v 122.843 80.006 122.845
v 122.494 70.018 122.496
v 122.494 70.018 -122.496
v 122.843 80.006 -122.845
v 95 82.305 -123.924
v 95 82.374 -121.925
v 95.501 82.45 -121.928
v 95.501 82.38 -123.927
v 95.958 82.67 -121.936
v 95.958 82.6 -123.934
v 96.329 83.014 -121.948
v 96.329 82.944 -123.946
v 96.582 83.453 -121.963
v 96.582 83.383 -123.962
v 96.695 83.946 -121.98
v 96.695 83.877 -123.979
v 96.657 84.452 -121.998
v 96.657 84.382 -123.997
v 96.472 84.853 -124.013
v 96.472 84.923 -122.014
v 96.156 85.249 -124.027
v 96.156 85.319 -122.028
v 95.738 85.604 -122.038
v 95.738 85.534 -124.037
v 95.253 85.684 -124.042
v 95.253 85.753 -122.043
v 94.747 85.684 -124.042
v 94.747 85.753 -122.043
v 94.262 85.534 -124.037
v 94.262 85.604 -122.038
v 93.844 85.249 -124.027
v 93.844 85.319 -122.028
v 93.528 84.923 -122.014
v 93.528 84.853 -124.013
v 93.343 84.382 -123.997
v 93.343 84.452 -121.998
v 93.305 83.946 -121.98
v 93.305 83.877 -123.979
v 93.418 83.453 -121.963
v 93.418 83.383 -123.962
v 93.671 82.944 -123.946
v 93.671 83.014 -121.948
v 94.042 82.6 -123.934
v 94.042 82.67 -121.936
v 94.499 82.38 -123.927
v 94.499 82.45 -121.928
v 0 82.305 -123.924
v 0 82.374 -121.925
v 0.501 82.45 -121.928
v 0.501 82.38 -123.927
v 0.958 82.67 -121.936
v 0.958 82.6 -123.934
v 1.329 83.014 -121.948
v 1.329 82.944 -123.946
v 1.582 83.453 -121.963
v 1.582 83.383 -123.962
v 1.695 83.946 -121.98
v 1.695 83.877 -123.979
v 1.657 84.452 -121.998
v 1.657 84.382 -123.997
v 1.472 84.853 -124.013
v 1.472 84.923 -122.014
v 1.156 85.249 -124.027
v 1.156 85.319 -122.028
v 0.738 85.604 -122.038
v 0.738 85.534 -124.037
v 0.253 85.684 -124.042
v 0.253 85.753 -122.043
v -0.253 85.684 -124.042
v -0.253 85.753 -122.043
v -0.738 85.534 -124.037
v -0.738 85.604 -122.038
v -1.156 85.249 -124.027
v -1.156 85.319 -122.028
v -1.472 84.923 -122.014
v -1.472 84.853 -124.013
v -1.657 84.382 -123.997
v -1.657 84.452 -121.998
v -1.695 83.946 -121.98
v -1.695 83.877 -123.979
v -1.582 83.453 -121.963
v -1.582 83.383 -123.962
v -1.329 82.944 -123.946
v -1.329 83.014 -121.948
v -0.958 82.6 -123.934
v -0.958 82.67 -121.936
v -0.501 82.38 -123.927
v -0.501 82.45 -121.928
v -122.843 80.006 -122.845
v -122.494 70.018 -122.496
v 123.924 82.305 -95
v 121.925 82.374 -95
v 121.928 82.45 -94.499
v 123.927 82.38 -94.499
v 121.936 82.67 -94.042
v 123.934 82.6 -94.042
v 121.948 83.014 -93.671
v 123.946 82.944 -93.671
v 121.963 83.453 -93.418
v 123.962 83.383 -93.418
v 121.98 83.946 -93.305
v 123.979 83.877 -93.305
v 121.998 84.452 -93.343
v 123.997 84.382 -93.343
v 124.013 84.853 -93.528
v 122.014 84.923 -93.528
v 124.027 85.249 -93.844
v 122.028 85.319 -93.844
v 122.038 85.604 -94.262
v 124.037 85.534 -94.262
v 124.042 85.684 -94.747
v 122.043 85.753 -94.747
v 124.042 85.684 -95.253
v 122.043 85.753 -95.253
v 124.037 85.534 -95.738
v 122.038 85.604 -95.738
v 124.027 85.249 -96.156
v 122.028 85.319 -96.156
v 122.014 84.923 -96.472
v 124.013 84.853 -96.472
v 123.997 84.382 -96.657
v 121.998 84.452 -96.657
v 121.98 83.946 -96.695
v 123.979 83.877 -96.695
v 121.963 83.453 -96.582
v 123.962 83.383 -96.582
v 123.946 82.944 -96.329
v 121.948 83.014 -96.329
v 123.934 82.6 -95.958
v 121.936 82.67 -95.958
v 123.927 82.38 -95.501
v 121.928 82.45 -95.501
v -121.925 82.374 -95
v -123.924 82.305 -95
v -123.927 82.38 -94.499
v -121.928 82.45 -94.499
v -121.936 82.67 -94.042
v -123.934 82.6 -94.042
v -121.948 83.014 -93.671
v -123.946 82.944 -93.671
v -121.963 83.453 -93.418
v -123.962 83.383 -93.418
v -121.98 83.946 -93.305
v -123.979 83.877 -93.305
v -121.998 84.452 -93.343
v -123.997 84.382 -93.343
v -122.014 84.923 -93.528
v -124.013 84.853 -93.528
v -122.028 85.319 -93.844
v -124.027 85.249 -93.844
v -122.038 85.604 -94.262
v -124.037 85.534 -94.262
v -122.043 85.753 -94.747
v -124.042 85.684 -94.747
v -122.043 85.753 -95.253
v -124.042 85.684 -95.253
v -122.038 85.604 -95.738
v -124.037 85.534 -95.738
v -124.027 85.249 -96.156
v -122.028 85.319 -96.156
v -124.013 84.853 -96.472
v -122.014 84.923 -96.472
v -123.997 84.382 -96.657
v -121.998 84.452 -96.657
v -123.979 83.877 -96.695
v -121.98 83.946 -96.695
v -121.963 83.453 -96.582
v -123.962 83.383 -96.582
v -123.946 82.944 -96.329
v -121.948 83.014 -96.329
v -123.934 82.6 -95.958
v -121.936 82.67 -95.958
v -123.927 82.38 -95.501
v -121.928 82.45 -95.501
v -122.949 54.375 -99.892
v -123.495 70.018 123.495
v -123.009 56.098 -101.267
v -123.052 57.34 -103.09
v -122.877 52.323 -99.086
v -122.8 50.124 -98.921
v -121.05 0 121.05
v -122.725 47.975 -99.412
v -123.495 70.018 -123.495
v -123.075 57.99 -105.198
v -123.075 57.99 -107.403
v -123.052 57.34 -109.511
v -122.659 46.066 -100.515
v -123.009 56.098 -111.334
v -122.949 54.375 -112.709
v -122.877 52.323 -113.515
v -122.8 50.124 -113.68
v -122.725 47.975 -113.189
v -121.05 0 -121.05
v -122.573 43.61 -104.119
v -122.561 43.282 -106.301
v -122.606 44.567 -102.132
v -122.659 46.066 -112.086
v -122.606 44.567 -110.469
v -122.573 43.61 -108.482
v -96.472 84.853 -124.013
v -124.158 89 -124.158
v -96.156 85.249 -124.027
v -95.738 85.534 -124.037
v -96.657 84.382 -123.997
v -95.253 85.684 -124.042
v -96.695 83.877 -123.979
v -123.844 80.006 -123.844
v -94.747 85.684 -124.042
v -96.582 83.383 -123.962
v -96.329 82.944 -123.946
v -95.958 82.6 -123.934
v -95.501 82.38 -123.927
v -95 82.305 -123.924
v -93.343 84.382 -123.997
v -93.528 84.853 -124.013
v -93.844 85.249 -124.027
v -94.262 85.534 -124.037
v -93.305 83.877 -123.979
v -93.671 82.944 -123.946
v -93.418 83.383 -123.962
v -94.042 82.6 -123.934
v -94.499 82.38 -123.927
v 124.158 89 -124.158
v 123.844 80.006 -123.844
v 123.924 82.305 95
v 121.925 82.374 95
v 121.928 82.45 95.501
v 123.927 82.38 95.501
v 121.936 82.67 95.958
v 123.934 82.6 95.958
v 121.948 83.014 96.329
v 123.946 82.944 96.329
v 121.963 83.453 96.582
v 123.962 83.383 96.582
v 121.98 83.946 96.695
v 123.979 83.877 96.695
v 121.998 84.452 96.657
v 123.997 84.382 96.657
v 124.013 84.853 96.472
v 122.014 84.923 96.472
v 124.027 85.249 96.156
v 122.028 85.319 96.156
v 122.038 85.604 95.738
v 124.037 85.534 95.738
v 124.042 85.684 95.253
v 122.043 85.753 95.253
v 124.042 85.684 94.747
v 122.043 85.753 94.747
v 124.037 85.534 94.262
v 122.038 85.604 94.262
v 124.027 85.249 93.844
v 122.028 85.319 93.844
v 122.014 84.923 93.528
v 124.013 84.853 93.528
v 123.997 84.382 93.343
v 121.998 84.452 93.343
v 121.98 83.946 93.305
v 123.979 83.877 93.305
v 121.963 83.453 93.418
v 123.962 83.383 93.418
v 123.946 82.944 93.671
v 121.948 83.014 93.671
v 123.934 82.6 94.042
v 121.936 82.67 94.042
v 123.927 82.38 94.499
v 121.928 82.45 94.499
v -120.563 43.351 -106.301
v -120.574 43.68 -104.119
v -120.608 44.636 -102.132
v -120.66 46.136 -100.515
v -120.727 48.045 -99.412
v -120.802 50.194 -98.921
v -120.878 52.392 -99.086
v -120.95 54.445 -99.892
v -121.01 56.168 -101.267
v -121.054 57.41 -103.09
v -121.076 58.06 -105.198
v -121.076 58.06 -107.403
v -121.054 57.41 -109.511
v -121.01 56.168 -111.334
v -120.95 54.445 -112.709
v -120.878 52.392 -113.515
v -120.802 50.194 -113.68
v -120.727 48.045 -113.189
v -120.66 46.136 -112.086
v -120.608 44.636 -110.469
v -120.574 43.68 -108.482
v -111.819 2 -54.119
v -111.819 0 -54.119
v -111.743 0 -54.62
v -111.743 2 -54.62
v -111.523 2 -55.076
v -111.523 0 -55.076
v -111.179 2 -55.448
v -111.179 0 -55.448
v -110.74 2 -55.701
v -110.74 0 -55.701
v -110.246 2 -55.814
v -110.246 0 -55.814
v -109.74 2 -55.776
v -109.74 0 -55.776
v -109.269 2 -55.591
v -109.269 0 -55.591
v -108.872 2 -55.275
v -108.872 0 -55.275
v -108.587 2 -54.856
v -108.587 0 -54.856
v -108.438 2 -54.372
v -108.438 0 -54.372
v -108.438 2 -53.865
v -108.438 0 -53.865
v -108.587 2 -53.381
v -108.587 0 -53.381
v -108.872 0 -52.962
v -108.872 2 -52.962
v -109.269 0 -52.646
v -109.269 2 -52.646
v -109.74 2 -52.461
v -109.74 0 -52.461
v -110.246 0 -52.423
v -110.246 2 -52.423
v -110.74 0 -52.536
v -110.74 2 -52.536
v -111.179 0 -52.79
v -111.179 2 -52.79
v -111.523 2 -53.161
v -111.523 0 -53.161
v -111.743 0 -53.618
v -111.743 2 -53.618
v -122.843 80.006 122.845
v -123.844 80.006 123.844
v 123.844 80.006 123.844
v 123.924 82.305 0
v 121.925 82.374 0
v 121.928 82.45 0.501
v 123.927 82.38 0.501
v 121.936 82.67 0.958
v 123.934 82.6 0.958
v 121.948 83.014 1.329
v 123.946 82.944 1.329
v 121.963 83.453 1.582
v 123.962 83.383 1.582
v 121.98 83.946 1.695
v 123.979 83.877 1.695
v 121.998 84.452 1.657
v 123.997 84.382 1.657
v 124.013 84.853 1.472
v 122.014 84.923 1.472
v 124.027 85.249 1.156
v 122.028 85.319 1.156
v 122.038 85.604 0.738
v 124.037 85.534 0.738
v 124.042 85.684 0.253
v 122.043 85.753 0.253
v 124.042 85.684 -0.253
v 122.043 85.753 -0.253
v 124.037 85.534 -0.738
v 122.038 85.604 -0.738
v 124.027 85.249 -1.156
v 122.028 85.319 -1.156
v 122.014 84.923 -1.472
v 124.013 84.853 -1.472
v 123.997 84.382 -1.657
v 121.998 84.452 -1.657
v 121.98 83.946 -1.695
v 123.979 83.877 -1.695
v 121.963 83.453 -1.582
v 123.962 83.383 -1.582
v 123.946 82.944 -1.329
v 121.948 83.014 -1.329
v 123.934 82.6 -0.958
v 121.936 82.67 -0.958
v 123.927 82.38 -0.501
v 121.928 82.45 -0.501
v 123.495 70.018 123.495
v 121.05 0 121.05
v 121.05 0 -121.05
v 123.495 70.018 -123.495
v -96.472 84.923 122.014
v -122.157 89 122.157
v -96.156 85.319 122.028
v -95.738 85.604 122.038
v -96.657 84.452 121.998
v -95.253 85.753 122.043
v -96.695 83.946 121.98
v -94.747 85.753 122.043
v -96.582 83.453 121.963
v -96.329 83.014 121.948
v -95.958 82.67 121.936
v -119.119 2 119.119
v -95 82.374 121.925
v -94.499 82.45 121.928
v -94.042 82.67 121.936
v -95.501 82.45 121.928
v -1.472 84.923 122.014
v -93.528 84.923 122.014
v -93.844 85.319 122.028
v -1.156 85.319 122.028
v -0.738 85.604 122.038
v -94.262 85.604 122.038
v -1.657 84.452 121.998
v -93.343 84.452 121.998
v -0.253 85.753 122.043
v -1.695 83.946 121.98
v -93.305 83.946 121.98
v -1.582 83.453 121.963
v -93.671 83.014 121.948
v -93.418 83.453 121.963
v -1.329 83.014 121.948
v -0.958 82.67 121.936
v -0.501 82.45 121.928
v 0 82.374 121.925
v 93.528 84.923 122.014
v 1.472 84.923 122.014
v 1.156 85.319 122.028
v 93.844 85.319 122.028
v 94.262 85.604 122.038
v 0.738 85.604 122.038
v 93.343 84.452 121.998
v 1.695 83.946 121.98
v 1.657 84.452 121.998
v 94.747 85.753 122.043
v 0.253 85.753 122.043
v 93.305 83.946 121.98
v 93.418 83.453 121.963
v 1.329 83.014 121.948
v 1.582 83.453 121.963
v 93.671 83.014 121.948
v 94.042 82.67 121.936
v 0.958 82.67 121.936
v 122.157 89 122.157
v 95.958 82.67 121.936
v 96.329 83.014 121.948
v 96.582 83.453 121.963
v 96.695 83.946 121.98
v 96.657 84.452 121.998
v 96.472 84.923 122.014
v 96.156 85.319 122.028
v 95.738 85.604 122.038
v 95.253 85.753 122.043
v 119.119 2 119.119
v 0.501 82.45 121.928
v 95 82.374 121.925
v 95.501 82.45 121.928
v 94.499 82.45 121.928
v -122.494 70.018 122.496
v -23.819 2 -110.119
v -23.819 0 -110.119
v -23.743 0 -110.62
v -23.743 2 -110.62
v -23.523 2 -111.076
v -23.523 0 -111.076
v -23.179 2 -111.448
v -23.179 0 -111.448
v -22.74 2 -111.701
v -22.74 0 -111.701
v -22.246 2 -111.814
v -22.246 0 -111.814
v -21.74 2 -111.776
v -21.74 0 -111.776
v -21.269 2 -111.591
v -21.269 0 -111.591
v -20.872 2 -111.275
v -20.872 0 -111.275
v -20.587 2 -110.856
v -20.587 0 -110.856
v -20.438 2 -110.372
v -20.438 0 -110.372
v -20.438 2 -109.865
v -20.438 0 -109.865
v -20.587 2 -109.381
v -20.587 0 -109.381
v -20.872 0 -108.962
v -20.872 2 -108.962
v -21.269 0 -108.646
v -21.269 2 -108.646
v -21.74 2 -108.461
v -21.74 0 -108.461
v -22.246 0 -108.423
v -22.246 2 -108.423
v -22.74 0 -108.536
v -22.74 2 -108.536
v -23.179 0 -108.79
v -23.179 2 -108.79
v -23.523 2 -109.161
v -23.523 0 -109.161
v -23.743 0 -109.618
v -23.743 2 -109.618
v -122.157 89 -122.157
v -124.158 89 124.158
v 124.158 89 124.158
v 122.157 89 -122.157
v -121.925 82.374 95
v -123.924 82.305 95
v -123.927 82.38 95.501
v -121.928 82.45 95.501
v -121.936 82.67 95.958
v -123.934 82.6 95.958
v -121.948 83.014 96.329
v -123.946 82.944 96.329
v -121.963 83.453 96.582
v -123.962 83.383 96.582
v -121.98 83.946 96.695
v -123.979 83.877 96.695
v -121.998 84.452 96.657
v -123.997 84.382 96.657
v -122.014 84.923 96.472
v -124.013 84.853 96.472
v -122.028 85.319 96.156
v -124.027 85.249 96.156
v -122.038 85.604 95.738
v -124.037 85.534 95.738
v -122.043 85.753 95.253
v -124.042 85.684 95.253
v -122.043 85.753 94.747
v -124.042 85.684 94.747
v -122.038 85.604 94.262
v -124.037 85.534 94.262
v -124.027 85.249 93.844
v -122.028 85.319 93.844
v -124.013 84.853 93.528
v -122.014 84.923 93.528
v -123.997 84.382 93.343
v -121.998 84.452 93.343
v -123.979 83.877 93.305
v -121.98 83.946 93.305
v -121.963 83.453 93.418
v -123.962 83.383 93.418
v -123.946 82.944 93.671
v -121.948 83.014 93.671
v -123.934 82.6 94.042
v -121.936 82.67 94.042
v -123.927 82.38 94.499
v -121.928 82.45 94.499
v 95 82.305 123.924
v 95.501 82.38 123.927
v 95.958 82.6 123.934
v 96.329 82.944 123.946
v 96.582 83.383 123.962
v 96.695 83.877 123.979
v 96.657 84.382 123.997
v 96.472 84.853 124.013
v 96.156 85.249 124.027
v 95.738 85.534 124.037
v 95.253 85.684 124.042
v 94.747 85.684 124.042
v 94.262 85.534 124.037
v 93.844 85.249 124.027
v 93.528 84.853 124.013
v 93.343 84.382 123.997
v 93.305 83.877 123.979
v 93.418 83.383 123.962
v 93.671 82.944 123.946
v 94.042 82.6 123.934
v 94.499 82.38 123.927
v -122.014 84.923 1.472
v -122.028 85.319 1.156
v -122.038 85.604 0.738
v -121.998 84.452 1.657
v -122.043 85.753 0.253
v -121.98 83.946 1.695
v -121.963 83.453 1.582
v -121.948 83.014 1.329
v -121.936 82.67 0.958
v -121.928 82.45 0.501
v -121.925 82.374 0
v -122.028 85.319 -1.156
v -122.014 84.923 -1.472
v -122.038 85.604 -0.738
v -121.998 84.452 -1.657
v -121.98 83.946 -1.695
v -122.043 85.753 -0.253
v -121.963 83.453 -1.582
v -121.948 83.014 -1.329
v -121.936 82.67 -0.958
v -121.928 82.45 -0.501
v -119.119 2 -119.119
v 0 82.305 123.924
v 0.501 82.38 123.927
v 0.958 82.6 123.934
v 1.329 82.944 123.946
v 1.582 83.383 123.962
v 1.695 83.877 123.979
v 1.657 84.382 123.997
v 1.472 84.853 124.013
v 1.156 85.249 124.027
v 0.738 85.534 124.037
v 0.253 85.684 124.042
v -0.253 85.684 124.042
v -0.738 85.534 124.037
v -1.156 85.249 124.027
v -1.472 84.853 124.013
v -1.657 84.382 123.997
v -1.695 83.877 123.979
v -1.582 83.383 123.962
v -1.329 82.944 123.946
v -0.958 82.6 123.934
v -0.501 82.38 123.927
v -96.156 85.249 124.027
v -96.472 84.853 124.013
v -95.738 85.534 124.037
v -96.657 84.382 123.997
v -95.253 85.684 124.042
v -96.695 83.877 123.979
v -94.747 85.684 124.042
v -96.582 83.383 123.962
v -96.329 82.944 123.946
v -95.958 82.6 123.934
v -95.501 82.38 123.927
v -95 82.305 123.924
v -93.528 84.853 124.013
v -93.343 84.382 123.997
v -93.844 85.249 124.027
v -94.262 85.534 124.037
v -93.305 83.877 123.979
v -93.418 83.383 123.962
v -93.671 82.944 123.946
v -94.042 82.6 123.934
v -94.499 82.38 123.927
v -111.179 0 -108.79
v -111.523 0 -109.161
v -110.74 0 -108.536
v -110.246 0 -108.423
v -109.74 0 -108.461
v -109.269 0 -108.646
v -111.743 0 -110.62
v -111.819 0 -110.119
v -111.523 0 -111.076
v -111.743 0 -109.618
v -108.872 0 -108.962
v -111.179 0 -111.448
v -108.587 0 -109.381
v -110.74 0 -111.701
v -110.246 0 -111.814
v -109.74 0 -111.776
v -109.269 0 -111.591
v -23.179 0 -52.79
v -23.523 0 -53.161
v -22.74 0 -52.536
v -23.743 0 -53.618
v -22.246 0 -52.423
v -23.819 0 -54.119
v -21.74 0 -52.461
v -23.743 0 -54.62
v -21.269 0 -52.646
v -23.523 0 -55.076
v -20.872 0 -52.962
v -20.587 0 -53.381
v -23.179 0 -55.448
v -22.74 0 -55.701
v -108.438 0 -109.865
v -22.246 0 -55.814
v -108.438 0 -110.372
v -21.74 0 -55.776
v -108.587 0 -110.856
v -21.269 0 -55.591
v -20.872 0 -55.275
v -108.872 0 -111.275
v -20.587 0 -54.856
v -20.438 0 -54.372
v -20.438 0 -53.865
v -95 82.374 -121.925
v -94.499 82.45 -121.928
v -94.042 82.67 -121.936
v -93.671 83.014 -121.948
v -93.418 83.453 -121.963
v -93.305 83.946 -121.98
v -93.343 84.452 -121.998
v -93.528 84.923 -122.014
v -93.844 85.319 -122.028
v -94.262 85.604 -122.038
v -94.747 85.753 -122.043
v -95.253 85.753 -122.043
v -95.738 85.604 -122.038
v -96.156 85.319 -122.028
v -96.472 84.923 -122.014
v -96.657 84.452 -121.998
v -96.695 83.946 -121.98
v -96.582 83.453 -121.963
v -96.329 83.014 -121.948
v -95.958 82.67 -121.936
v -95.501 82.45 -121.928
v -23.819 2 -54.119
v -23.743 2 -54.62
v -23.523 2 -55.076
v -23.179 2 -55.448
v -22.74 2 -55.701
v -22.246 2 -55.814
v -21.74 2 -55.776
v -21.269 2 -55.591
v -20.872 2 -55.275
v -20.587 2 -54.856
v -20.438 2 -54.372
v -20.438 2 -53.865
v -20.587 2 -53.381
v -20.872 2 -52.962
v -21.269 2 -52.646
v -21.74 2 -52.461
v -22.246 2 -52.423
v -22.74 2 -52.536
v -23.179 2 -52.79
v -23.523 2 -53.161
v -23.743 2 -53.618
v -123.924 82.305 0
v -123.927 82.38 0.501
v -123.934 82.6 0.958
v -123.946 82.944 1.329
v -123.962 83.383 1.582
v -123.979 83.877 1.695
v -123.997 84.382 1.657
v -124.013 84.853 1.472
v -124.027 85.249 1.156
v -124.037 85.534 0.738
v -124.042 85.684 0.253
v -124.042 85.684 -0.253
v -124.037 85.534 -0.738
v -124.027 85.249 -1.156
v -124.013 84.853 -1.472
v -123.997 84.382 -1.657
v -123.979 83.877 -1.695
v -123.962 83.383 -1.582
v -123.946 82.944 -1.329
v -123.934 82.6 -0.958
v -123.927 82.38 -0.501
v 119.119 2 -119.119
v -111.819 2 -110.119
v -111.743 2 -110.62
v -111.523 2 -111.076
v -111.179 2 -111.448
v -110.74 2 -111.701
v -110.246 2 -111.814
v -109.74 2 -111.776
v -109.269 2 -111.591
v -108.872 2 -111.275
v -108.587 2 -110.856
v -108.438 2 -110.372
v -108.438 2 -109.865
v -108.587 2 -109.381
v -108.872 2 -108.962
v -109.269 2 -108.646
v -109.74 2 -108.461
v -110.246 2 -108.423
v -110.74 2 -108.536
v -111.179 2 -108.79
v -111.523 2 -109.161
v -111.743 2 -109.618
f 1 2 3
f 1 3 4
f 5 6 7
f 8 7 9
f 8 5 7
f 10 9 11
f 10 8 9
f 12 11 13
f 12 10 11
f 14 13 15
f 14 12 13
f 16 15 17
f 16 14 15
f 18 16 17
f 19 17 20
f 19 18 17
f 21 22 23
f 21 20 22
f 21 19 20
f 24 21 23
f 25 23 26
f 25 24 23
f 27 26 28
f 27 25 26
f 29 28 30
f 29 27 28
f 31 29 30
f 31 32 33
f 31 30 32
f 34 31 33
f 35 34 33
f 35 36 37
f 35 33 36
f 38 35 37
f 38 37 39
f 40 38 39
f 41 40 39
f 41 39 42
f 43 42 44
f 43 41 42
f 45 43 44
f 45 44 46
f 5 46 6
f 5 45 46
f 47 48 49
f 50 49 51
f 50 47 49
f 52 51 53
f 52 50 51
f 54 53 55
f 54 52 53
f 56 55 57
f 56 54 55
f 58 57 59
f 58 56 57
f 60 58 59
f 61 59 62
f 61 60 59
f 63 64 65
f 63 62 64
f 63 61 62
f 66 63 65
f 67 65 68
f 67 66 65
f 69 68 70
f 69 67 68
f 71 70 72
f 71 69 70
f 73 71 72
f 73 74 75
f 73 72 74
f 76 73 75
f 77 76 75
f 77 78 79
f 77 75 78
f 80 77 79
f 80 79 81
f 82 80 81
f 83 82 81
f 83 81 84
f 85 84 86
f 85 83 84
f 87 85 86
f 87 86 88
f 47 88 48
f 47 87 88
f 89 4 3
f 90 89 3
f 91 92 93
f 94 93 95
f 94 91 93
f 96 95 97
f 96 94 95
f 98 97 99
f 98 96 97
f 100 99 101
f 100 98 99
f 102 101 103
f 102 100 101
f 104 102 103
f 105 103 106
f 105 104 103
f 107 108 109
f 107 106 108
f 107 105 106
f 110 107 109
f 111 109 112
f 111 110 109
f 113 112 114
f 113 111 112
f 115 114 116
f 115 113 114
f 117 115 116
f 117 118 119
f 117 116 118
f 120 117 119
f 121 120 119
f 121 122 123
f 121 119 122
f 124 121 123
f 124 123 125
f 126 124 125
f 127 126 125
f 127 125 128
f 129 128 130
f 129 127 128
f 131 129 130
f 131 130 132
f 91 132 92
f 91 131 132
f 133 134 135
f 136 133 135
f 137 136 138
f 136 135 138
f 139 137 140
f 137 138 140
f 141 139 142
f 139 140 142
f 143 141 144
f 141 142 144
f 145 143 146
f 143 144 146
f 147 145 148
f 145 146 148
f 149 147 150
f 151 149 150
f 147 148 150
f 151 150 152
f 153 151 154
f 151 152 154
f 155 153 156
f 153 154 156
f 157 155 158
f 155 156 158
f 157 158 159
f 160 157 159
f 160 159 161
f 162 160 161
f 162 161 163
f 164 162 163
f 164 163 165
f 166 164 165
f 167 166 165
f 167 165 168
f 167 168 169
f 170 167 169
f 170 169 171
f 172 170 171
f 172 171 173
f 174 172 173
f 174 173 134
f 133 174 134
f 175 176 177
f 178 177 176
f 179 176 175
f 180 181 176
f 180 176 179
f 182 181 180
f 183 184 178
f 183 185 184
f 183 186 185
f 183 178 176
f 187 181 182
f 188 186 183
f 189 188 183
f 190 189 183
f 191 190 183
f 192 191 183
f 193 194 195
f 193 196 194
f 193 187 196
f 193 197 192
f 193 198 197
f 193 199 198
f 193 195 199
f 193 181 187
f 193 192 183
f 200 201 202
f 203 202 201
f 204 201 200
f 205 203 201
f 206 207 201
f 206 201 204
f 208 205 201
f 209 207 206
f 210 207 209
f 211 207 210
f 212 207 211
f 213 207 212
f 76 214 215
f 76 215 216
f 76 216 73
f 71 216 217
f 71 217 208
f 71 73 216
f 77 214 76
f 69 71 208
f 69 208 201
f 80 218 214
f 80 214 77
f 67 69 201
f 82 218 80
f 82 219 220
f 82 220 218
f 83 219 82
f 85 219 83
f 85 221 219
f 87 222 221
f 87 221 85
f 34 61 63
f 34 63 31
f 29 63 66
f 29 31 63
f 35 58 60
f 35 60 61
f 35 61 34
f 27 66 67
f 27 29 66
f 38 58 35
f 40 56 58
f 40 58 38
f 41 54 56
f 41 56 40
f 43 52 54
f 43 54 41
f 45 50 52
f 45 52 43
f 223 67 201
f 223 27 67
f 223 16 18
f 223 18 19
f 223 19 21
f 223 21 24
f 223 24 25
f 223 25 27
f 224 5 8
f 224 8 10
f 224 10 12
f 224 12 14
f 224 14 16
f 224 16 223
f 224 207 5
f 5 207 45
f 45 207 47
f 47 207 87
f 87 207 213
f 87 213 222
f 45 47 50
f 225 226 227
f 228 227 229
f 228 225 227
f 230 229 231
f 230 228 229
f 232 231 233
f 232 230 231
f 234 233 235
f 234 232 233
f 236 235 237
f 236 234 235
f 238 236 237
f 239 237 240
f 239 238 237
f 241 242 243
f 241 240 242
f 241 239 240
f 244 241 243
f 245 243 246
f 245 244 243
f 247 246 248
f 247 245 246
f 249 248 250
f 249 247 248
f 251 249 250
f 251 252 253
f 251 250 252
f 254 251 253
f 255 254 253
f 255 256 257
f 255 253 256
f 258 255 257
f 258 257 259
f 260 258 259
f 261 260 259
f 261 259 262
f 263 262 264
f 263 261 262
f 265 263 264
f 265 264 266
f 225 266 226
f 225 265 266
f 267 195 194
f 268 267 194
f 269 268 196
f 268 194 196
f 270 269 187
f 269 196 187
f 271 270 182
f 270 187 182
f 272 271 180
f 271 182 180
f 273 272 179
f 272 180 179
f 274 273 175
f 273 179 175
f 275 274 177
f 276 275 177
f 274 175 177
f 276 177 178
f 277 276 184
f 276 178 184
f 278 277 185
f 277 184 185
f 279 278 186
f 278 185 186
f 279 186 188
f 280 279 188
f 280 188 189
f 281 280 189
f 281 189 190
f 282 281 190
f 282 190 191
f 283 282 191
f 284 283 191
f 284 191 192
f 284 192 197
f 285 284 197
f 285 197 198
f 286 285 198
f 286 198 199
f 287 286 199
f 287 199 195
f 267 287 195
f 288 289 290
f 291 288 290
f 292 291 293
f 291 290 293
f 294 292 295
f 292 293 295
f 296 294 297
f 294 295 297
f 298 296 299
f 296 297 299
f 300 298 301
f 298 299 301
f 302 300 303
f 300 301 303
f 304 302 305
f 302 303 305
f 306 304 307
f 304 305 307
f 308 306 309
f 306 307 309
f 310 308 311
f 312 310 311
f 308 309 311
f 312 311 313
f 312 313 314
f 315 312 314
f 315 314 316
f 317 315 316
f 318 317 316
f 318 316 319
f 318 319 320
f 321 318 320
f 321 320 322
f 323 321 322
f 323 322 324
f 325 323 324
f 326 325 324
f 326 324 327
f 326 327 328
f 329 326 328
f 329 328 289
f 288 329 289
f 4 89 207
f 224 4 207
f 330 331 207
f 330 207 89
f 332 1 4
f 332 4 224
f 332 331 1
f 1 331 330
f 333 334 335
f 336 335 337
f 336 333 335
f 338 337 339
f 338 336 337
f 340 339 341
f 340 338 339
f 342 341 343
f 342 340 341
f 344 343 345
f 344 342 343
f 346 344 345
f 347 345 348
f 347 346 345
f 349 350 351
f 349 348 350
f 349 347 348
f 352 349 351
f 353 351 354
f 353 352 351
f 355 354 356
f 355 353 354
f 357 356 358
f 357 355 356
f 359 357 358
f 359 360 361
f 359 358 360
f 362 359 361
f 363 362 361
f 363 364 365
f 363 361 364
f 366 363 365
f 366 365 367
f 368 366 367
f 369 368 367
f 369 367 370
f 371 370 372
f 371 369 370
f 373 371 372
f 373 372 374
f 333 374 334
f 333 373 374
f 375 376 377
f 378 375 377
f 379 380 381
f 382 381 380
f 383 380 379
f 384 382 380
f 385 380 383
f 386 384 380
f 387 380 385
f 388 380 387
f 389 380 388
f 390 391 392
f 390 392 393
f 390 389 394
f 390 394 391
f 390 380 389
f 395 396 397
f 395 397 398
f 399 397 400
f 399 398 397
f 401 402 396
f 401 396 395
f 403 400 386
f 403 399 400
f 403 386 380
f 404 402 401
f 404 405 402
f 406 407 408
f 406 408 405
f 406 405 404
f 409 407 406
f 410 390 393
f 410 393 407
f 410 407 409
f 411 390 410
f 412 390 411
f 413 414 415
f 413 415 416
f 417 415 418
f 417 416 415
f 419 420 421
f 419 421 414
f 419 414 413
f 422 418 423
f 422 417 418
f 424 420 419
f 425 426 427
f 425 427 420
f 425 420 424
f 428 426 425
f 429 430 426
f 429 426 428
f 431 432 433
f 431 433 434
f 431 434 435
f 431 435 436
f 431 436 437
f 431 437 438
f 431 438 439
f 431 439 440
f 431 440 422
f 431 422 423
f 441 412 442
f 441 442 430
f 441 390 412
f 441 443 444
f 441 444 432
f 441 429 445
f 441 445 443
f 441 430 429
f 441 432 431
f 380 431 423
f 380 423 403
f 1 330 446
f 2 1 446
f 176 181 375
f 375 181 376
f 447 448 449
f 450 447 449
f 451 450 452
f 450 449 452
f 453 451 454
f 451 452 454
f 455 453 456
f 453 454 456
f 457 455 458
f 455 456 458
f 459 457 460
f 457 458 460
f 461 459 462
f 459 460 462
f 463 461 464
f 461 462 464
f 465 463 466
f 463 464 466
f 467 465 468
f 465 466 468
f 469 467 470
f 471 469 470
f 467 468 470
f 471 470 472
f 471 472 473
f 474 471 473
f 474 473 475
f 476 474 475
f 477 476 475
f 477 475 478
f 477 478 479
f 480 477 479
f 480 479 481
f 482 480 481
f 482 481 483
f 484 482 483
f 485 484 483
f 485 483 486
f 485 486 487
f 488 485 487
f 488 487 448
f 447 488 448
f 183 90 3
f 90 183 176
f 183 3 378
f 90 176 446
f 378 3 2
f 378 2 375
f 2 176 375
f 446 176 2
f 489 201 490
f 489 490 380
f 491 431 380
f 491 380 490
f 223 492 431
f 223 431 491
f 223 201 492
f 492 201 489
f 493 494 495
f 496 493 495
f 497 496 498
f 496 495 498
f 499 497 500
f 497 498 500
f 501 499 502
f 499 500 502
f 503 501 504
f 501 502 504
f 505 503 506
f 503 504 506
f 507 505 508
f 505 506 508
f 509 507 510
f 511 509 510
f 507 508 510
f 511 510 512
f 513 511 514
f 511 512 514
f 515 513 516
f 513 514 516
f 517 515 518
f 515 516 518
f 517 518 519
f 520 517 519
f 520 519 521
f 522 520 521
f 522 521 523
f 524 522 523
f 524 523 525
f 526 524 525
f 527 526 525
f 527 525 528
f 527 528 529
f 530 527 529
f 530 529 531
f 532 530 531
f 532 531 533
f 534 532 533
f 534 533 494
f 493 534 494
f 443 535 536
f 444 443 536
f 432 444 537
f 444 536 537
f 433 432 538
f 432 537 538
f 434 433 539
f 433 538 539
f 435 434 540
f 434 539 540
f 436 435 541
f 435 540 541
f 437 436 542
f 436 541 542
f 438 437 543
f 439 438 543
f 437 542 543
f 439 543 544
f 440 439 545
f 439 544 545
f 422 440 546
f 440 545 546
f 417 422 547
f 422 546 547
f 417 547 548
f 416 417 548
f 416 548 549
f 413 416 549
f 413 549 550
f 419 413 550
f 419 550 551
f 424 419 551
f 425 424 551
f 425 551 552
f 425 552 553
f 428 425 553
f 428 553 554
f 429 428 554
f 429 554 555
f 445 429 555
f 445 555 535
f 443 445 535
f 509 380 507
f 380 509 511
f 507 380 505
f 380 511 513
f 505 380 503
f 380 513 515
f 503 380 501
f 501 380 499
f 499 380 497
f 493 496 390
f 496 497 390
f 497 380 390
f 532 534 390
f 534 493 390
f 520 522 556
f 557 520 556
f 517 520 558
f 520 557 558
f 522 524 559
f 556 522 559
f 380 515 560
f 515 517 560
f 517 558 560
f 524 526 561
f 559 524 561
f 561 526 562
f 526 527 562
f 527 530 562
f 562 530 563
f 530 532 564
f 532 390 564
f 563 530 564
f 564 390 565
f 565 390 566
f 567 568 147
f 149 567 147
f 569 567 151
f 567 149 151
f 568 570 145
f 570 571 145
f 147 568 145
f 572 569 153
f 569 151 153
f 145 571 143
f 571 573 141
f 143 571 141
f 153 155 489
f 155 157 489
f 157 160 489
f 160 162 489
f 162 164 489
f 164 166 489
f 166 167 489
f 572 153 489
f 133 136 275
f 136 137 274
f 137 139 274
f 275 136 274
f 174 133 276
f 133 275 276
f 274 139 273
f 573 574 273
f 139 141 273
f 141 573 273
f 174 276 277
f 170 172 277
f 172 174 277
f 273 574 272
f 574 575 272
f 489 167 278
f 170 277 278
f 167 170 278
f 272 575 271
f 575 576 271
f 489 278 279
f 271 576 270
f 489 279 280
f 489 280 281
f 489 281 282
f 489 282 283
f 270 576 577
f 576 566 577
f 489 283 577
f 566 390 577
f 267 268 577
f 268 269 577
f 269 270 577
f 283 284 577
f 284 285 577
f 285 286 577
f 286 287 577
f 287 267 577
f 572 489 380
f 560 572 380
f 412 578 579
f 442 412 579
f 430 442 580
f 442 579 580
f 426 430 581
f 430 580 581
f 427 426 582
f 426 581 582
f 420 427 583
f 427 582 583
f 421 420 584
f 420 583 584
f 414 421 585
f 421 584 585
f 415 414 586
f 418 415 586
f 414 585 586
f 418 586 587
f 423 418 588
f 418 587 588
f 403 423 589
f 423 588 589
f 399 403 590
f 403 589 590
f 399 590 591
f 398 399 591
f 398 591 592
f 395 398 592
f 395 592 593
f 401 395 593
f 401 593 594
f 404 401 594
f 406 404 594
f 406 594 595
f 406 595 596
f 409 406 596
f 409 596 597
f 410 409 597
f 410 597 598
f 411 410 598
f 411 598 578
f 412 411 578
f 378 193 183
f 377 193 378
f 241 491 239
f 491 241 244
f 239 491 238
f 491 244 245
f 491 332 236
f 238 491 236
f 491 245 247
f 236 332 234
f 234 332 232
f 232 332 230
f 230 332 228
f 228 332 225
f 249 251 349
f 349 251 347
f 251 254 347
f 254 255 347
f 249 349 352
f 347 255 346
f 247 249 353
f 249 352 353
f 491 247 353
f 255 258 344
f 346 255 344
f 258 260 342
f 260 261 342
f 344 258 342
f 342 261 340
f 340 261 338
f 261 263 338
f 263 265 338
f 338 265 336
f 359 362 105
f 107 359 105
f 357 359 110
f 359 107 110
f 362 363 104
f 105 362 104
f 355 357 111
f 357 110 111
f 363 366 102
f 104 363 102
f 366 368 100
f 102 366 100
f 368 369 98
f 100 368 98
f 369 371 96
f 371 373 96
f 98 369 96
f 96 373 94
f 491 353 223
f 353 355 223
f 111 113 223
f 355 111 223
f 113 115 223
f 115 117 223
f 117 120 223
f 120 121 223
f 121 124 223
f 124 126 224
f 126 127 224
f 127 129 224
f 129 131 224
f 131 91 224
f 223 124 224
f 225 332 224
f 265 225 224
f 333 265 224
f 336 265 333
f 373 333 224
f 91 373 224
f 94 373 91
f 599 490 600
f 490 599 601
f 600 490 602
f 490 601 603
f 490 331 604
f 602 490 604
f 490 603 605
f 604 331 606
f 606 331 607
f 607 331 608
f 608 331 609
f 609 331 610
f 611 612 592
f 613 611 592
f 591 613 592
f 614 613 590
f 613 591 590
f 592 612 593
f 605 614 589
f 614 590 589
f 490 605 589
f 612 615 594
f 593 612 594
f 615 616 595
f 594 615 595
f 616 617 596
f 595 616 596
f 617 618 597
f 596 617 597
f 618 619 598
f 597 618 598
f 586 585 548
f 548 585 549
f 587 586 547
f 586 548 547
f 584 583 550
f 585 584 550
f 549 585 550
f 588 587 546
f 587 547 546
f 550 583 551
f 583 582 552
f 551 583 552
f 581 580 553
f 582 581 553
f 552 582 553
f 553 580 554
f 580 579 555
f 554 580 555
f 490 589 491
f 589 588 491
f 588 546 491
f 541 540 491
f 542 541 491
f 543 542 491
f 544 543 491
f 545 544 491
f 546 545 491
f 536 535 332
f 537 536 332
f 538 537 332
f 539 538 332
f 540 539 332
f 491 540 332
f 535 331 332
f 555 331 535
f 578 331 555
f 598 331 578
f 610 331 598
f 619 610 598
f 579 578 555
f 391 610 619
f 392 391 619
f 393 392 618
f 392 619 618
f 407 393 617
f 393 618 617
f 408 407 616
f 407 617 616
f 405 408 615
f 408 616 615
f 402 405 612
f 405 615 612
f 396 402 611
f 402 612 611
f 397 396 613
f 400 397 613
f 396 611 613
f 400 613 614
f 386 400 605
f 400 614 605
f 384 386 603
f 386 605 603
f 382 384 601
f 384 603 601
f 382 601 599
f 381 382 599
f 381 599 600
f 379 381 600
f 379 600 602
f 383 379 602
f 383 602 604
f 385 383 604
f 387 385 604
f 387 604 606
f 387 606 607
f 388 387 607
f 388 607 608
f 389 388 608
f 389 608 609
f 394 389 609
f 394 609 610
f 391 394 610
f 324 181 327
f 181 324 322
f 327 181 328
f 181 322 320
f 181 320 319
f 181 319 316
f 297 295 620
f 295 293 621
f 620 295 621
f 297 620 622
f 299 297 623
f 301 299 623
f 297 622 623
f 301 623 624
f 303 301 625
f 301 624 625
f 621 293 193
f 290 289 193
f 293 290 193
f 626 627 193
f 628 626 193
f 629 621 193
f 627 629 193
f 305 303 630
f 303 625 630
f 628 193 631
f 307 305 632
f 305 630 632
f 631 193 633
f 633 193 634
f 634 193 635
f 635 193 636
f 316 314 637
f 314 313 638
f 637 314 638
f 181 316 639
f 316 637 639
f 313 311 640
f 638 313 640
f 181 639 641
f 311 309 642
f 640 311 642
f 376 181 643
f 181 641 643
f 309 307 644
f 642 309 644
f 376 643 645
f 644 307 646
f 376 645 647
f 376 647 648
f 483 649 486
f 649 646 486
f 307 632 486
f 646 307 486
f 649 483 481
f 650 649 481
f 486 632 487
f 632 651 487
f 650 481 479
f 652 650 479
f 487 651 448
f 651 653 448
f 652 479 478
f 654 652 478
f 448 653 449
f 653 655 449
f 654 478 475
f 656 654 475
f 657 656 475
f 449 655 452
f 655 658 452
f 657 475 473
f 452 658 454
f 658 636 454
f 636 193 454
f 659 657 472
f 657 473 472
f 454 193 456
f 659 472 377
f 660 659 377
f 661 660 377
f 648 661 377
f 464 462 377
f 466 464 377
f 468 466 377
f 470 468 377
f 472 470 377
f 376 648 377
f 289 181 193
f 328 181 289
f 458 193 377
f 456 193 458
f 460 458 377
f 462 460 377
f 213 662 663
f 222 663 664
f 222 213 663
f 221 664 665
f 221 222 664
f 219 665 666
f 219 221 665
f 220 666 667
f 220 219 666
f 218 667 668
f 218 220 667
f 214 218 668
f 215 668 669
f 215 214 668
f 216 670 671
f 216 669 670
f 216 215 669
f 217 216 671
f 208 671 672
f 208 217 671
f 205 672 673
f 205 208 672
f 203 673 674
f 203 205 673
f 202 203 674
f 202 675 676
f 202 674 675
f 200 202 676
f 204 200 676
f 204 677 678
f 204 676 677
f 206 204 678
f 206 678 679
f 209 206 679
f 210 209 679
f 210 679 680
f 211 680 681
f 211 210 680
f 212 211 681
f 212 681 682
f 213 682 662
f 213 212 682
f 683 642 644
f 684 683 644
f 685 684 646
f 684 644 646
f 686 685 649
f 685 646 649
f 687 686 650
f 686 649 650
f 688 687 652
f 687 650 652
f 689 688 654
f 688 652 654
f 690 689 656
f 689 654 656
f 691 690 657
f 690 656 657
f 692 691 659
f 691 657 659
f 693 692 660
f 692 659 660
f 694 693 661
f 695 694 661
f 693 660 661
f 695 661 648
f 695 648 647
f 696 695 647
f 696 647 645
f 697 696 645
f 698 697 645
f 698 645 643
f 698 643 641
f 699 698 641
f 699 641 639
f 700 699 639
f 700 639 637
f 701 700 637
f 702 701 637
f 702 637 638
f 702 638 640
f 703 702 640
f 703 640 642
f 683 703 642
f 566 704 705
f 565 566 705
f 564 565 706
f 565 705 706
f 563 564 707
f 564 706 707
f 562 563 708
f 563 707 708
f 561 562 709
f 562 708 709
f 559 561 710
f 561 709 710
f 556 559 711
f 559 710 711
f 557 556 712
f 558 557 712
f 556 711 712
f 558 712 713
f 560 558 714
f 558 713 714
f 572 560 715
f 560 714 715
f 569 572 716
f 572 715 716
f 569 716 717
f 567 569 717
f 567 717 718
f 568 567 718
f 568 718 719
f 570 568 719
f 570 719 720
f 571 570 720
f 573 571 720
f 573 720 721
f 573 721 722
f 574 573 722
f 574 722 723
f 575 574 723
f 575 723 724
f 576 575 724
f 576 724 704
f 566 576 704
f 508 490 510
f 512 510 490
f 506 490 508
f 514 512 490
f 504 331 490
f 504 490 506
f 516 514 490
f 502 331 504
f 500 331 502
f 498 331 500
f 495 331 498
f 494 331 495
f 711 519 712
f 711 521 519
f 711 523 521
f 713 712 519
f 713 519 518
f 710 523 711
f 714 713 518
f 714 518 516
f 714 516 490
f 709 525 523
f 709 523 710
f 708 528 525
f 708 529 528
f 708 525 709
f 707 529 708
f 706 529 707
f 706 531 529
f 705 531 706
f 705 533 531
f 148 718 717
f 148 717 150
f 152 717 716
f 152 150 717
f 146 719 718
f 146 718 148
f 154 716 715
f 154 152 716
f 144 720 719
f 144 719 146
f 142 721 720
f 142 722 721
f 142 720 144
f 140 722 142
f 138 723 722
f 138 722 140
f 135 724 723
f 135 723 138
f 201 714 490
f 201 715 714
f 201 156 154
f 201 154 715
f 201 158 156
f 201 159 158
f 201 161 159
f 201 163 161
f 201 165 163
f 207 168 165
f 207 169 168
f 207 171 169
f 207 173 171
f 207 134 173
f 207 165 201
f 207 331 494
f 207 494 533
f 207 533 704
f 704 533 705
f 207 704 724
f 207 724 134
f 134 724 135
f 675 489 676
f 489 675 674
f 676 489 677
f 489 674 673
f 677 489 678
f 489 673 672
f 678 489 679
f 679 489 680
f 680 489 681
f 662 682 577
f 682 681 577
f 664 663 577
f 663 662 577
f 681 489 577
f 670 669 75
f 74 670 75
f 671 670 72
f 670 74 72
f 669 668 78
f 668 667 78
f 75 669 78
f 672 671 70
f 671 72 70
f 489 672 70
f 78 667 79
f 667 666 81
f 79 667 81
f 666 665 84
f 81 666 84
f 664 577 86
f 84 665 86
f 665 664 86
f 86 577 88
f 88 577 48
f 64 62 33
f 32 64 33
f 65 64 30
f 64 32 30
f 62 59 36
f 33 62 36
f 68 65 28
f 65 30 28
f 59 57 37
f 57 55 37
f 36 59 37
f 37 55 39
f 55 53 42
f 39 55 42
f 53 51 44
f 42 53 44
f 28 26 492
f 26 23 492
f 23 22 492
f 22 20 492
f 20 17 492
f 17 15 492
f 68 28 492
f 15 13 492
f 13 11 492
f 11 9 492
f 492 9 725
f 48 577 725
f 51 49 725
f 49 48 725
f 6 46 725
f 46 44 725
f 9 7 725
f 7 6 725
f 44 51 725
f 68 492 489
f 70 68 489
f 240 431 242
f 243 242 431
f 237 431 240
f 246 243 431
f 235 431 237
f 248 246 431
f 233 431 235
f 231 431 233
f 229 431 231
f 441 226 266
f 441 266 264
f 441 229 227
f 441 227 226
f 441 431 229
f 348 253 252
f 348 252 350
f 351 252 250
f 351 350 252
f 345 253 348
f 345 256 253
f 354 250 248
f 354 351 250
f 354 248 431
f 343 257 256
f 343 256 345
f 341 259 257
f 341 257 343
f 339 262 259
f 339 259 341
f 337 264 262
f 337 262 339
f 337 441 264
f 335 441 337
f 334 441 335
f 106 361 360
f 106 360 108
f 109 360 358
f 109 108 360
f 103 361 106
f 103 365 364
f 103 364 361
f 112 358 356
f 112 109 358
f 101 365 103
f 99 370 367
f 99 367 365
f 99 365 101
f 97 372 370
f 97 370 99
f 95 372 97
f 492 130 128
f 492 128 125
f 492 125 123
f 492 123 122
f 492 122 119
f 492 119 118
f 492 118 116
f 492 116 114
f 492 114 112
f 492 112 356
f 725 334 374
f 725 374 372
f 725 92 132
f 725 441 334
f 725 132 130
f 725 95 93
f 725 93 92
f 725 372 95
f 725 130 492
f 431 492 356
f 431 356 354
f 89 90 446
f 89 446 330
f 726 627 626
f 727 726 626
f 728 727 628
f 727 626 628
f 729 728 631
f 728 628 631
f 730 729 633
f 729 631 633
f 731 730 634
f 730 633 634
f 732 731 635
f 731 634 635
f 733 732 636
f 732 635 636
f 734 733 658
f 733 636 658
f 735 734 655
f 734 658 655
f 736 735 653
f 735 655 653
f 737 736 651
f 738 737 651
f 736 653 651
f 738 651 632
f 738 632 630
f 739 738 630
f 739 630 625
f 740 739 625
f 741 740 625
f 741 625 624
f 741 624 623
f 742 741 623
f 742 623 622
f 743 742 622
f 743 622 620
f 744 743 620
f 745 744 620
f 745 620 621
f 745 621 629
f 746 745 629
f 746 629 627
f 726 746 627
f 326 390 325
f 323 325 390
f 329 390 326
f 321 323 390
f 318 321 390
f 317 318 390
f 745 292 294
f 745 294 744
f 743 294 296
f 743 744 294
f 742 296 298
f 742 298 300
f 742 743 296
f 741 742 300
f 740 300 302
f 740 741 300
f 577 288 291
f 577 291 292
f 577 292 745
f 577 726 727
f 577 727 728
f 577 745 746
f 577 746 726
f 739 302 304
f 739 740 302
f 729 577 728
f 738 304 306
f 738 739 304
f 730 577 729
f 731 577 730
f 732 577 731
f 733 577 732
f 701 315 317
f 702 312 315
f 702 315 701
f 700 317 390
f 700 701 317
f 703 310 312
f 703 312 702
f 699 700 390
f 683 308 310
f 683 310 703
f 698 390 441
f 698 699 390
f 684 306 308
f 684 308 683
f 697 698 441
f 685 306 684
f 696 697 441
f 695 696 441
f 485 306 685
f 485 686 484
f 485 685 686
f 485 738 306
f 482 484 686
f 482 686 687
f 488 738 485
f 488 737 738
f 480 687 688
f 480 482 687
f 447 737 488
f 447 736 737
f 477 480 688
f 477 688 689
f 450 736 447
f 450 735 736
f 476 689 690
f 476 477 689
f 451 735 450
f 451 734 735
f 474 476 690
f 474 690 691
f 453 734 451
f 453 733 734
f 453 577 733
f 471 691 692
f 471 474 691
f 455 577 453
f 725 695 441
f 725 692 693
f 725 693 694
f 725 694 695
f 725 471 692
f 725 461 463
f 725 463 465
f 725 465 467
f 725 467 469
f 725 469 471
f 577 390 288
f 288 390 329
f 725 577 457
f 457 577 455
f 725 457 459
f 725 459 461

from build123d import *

# Parameters (mm, degrees)
SKETCH1_W                       = 242.1
SKETCH1_H                       = 242.1
BOSS_EXTRUDE1_DEPTH             = 90
BOSS_EXTRUDE1_DRAFT             = -2
SHELL1_T                        = -2
CUT_EXTRUDE7_DEPTH              = 291.648708719
CUT_EXTRUDE8_DEPTH              = 291.648708719
M3_CLEARANCE_HOLE2_D            = 3.4
SKETCH15_R                      = 1.7
CUT_EXTRUDE9_DEPTH              = 10
SKETCH16_R                      = 1.7
CUT_EXTRUDE10_DEPTH             = 10
CUT_EXTRUDE11_DEPTH             = 198.351811614
CUT_EXTRUDE11_DEPTH_BACK        = 198.351811614
CUT_EXTRUDE12_REACH             = 292.104
SKETCH21_R                      = 7.4
CUT_EXTRUDE12_DIRECTION_2_DEPTH = 291.103764671


with BuildPart() as part:
    # Sketch1 → Boss-Extrude1 (with draft: the straight prism first)
    with BuildSketch(Plane(origin=(0, 0, 0), x_dir=(1, 0, 0), z_dir=(0, 1, 0))):
        Rectangle(SKETCH1_W, SKETCH1_H)
    extrude(amount=BOSS_EXTRUDE1_DEPTH)
    # Boss-Extrude1: the draft: its side faces are tilted about the plane it starts from
    boss_extrude1_sides = [part.faces().sort_by_distance(p)[0] for p in [
        (0, 45, 121.05),
        (121.05, 45, 0),
        (0, 45, -121.05),
        (-121.05, 45, 0),
    ]]
    draft(boss_extrude1_sides, Plane(origin=(0, 0, 0), x_dir=(1, 0, 0), z_dir=(0, 1, 0)), BOSS_EXTRUDE1_DRAFT)

    # Shell1
    shell1_openings = [part.faces().sort_by_distance(p)[0] for p in [
        (0, 90, 0),
    ]]
    offset(amount=SHELL1_T, openings=shell1_openings, kind=Kind.INTERSECTION)

    # Sketch6 → Cut-Extrude7 (cut, through all, along a direction that is not the sketch's normal)
    with BuildSketch(Plane(origin=(0, -4.222010573, 120.902564142), x_dir=(1, 0, 0), z_dir=(0, -0.03489949670250105, 0.9993908270190958))):
        Polygon((-123.843874287, 84.279443063), (-123.49509166, 74.28552738), (-122.494482858, 74.28552738), (-122.843265485, 84.279443063), align=None)
    cut_extrude7 = extrude(amount=-CUT_EXTRUDE7_DEPTH, dir=(0, 0, 1), mode=Mode.SUBTRACT)

    # Sketch7 → Cut-Extrude8 (cut, through all, along a direction that is not the sketch's normal)
    with BuildSketch(Plane(origin=(-120.902564142, -4.222010573, 0), x_dir=(0, 0, 1), z_dir=(-0.9993908270190958, -0.03489949670250105, 0))):
        Polygon((123.845093004, 84.279443063), (122.845093004, 84.279443063), (122.496310376, 74.28552738), (123.496310376, 74.28552738), align=None)
    cut_extrude8 = extrude(amount=-CUT_EXTRUDE8_DEPTH, dir=(-1, 0, 0), mode=Mode.SUBTRACT)

    # Mirror1: Cut-Extrude7 across plane
    add(cut_extrude7.mirror(Plane(origin=(0, 0, 0), x_dir=(0, 0, 1), z_dir=(1, 0, 0))), mode=Mode.SUBTRACT)

    # Mirror2: Cut-Extrude8 across plane
    add(cut_extrude8.mirror(Plane.XY), mode=Mode.SUBTRACT)

    # M3 Clearance Hole2 (through all)
    with Locations(Plane(origin=(0, 2, 0), x_dir=(1, 0, 0), z_dir=(0, 1, 0))):
        with Locations((-110.11862245, 54.11862245), (-110.11862245, 110.11862245), (-22.11862245, 110.11862245), (-22.11862245, 54.11862245)):
            Hole(M3_CLEARANCE_HOLE2_D / 2)

    # Sketch15 → Cut-Extrude9 (cut)
    with BuildSketch(Plane(origin=(0, -4.222010573, 120.902564142), x_dir=(1, 0, 0), z_dir=(0, -0.03489949670250105, 0.9993908270190958))):
        with Locations(Location((0, 88.279443063, 0), (0, 0, 270))):
            Circle(SKETCH15_R)
        with Locations(Location((-95, 88.279443063, 0), (0, 0, 270))):
            Circle(SKETCH15_R)
        with Locations(Location((95, 88.279443063, 0), (0, 0, 270))):
            Circle(SKETCH15_R)
    cut_extrude9 = extrude(amount=-CUT_EXTRUDE9_DEPTH, mode=Mode.SUBTRACT)

    # Mirror3: Cut-Extrude9 across plane
    add(cut_extrude9.mirror(Plane.XY), mode=Mode.SUBTRACT)

    # Sketch16 → Cut-Extrude10 (cut)
    with BuildSketch(Plane(origin=(-120.902564142, -4.222010573, 0), x_dir=(0, 0, 1), z_dir=(-0.9993908270190958, -0.03489949670250105, 0))):
        with Locations(Location((0, 88.279443063, 0), (0, 0, 270))):
            Circle(SKETCH16_R)
        with Locations(Location((95, 88.279443063, 0), (0, 0, 270))):
            Circle(SKETCH16_R)
        with Locations(Location((-95, 88.279443063, 0), (0, 0, 270))):
            Circle(SKETCH16_R)
    cut_extrude10 = extrude(amount=-CUT_EXTRUDE10_DEPTH, mode=Mode.SUBTRACT)

    # Mirror4: Cut-Extrude10 across plane
    add(cut_extrude10.mirror(Plane(origin=(0, 0, 0), x_dir=(0, 0, 1), z_dir=(1, 0, 0))), mode=Mode.SUBTRACT)

    # Sketch18 → Cut-Extrude11 (cut, two sides: drawn at the far end of the back side and taken through both)
    with BuildSketch(Plane.XY.offset(-CUT_EXTRUDE11_DEPTH_BACK)):
        Polygon((-124.192869254, 90), (-124.157948485, 89), (124.157948485, 89), (124.192869254, 90), align=None)
    extrude(amount=CUT_EXTRUDE11_DEPTH + CUT_EXTRUDE11_DEPTH_BACK, mode=Mode.SUBTRACT)

    # Sketch21 → Cut-Extrude12 (cut, up to next)
    with BuildSketch(Plane(origin=(-120.902564142, -4.222010573, 0), x_dir=(0, 0, 1), z_dir=(-0.9993908270190958, -0.03489949670250105, 0)), mode=Mode.PRIVATE) as cut_extrude12_sk1:
        with Locations(Location((-106.300517026, 54.932485221, 0), (0, 0, 270))):
            Circle(SKETCH21_R)
    cut_extrude12_tool1 = extrude(cut_extrude12_sk1.sketch, amount=-CUT_EXTRUDE12_REACH, mode=Mode.PRIVATE) & part.part
    add(cut_extrude12_tool1.solids().sort_by_distance((-122.81968, 50.677011, -106.300517))[0], mode=Mode.SUBTRACT)

    # Sketch21 → Cut-Extrude12 direction 2 (cut)
    with BuildSketch(Plane(origin=(-120.902564142, -4.222010573, 0), x_dir=(0, 0, 1), z_dir=(-0.9993908270190958, -0.03489949670250105, 0))):
        with Locations(Location((-106.300517026, 54.932485221, 0), (0, 0, 270))):
            Circle(SKETCH21_R)
    extrude(amount=CUT_EXTRUDE12_DIRECTION_2_DEPTH, mode=Mode.SUBTRACT)


solid = part.part
